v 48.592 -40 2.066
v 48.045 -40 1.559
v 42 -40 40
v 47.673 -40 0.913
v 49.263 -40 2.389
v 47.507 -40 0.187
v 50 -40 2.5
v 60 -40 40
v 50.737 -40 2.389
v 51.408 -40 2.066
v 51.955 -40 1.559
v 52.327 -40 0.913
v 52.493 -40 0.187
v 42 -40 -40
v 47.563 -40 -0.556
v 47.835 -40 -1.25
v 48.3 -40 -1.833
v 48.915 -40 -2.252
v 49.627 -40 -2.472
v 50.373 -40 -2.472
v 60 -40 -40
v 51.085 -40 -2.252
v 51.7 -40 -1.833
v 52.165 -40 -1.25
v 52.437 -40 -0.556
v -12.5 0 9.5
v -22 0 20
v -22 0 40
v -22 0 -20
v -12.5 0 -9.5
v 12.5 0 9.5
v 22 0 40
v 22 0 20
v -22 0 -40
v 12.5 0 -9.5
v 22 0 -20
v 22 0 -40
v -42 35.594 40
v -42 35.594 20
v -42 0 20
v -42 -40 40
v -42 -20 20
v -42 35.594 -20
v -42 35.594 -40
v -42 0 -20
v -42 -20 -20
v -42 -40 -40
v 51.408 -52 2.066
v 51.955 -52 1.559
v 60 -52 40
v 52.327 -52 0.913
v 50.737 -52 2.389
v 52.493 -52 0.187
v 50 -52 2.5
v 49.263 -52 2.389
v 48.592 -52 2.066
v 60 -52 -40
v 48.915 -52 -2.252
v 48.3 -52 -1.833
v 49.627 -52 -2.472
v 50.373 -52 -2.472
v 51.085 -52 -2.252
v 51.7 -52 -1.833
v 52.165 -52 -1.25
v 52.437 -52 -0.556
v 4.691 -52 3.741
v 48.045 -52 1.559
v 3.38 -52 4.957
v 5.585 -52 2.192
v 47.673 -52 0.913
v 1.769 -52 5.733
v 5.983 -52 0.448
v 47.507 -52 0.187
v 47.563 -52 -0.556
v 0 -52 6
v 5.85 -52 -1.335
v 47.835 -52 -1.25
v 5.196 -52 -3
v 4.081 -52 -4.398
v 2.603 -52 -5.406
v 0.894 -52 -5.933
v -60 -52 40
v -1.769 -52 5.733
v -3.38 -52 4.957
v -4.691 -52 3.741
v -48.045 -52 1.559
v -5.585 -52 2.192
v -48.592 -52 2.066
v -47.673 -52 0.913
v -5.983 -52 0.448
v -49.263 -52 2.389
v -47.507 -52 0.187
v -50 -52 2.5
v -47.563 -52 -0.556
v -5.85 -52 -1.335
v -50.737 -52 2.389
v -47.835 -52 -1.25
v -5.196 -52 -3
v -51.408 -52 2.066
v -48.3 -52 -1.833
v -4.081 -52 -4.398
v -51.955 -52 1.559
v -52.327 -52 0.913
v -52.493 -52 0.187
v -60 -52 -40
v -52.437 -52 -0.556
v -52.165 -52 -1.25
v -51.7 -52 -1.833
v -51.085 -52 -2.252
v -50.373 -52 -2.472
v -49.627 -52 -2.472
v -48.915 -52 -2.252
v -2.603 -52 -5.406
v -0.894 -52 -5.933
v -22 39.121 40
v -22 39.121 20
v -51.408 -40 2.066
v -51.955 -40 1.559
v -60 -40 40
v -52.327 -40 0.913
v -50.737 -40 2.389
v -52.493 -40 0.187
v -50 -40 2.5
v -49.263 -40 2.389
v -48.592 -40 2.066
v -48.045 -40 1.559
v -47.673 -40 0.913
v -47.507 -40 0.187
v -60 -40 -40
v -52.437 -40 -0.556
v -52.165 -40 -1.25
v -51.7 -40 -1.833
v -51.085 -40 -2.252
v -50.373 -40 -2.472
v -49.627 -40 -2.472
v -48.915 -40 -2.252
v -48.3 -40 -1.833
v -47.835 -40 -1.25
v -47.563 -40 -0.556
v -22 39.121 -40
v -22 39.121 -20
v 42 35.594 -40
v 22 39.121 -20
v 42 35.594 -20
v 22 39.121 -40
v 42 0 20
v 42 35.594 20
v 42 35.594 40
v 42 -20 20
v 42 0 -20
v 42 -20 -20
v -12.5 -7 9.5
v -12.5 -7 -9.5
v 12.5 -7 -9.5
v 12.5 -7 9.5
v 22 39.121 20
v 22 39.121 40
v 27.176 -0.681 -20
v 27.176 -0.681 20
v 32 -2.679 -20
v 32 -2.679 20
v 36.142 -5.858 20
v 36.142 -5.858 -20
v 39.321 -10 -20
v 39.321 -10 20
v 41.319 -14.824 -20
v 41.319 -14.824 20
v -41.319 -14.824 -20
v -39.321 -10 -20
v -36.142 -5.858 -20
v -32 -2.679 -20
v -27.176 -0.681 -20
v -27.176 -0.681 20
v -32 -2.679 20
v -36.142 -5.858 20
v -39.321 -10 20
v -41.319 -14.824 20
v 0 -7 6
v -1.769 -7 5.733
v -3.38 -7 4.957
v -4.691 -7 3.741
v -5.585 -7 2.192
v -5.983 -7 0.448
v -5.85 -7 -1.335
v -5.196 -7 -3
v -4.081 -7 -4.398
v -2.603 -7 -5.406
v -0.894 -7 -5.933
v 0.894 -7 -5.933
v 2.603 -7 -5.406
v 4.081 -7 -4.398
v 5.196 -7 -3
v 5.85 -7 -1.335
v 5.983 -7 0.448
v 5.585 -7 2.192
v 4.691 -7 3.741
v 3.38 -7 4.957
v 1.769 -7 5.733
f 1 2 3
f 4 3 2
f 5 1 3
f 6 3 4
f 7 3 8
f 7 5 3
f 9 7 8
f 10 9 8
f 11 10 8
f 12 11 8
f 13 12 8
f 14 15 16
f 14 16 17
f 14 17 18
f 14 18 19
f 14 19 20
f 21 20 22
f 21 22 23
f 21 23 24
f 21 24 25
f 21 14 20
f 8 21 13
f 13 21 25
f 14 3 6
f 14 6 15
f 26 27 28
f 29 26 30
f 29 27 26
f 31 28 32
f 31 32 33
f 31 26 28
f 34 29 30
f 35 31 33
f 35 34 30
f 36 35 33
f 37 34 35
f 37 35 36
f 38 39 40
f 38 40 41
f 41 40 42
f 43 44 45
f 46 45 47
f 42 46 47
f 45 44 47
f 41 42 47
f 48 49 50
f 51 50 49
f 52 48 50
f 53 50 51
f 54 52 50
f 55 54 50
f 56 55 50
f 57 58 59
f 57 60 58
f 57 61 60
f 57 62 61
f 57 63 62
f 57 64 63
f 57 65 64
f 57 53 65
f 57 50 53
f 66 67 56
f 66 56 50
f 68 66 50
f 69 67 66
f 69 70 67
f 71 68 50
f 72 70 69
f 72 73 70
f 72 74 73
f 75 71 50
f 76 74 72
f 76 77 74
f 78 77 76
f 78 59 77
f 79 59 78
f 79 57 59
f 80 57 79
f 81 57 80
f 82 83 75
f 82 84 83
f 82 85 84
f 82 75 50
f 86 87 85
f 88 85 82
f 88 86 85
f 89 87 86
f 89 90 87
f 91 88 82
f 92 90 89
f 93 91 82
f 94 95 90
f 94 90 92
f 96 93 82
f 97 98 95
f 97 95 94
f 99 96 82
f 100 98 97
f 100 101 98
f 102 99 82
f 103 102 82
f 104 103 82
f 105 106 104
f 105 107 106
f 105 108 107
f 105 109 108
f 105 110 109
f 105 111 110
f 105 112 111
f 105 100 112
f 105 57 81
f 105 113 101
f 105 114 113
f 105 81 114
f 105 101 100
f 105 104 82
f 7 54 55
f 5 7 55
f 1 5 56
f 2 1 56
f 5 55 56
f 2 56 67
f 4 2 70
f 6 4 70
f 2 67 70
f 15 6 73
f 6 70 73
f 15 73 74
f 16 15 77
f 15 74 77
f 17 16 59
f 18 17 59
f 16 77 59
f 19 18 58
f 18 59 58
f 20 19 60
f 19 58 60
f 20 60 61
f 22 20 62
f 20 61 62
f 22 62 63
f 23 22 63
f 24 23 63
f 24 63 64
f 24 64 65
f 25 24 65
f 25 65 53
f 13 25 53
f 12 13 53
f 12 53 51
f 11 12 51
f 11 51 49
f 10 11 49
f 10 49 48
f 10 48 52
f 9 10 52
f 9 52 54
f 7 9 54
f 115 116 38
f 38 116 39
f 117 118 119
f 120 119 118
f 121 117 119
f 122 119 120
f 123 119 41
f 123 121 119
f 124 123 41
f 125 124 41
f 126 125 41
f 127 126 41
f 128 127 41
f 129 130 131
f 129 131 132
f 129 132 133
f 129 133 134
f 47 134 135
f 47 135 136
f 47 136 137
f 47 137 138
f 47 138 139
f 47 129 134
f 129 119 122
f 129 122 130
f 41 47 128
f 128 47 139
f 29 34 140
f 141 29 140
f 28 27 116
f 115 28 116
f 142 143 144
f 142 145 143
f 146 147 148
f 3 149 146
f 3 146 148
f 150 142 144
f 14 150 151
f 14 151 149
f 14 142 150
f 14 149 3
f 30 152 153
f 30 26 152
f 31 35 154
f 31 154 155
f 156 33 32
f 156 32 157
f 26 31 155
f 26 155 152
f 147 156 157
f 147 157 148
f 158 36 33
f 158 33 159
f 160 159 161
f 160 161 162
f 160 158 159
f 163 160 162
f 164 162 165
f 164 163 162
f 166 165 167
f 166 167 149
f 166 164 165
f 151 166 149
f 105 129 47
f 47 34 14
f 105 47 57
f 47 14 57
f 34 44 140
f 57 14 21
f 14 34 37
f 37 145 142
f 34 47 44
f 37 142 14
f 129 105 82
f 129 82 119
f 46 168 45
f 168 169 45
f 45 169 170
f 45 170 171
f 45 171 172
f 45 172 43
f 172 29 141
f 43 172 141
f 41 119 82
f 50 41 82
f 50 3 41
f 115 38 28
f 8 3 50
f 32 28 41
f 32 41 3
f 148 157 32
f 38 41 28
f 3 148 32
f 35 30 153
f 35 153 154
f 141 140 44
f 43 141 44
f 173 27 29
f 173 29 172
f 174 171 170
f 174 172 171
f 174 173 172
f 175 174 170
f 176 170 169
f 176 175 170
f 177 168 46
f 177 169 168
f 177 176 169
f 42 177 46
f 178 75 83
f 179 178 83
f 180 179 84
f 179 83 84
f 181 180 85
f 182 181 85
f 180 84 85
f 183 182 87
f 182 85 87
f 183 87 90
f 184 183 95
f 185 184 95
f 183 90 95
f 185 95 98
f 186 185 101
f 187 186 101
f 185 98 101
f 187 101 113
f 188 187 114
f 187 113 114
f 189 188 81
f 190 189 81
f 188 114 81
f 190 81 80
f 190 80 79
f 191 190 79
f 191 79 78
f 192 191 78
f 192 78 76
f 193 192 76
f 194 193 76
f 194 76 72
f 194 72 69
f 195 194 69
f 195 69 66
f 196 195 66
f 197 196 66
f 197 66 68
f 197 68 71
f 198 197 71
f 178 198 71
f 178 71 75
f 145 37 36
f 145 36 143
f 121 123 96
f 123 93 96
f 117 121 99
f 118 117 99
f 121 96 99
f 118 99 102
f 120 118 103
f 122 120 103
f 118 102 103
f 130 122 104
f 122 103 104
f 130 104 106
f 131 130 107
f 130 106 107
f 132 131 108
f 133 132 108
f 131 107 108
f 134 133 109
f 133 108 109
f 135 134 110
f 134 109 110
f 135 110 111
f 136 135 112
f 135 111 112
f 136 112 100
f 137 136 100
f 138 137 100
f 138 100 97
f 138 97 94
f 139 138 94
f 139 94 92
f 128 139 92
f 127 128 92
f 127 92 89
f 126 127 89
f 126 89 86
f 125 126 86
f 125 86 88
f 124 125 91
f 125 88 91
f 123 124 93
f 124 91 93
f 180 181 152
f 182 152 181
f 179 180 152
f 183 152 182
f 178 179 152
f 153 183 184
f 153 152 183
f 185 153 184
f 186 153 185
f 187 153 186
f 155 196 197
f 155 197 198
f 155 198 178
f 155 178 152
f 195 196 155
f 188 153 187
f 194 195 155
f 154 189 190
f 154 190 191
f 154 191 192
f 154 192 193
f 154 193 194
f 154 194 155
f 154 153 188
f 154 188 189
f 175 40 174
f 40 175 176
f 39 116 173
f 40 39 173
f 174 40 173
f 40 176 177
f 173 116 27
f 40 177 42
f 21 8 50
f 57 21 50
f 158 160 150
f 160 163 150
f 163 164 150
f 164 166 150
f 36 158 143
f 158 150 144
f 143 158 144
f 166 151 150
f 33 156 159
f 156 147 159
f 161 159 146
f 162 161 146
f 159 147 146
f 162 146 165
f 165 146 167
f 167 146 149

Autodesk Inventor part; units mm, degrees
ref_plane "YZ Plane" through (0, 0, 0) normal (1, 0, 0) x (0, 1, 0)
ref_plane "XZ Plane" through (0, 0, 0) normal (0, 1, 0) x (-1, 0, 0)
ref_plane "XY Plane" through (0, 0, 0) normal (0, 0, 1) x (1, 0, 0)
sketch "Sketch1" plane through (0, 0, 0) normal (0, 0, 1) x (1, 0, 0)
  line L0 (-60, 0) -> (60, 0)
  line L1 (60, 0) -> (60, -52)
  line L2 (60, -52) -> (-60, -52)
  line L3 (-60, -52) -> (-60, 0)
  line L4 (0, -62.4) -> (0, 10.4) projected
  point P0 (0, 0)
  dimension "d0" = 120
  dimension "d1" = 52
extrude "Extrusion1" add sketch "Sketch1" along normal mid plane 80
sketch "Sketch2" plane through (-60, 0, 40) normal (0, 1, 0) x (1, 0, 0)
  line L0 (47.5, 49.5) -> (72.5, 49.5)
  line L1 (72.5, 49.5) -> (72.5, 30.5)
  line L2 (72.5, 30.5) -> (47.5, 30.5)
  line L3 (47.5, 30.5) -> (47.5, 49.5)
  line L4 (-24, 40) -> (144, 40) projected
  line L5 (60, 96) -> (60, -16) projected
  point P0 (60, 40)
  dimension "d4" = 19
  dimension "d5" = 25
extrude "Extrusion2" cut sketch "Sketch2" against normal blind 7
sketch "Sketch3" plane through (-60, 0, 40) normal (0, 1, 0) x (1, 0, 0)
  point P0 (60, 40)
  point P1 (60, 40)
hole "Hole1" at (0, 0, 0) direction (0, -1, 0) diameter 12 end through all
sketch "Sketch4" plane through (-60, 0, 40) normal (0, 1, 0) x (1, 0, 0)
  line L0 (-24, 40) -> (144, 40) projected
  line L1 (60, 96) -> (60, -16) projected
  point P0 (60, 40)
  point P1 (10, 40)
  point P2 (110, 40)
  dimension "d15" = 50
hole "Hole2" at (-50, 0, 0) at (50, 0, 0) direction (0, -1, 0) diameter 5 end through all
sketch "Sketch5" plane through (0, 0, 0) normal (0, 0, 1) x (1, 0, 0)
  circle A0 centre (0, 43) radius 10.1 projected
  line L0 (0, 43) -> (42, 35.5943)
  line L1 (60, 0) -> (-60, 0) projected
  line L2 (42, 35.5943) -> (42, 0)
  line L3 (22, 0) -> (22, 39.1208)
  line L4 (22, 0) -> (42, 0)
  line L5 (0, -10.62) -> (0, 63.72) projected
  line L6 (0, 43) -> (-42, 35.5943)
  line L7 (-60, 0) -> (60, 0)
  line L8 (-42, 35.5943) -> (-42, 0)
  line L9 (-22, 0) -> (-22, 39.1208)
  point P0 (0, 0)
  dimension "d23" = 22
  dimension "d24" = 42
  dimension "d29" = 10
extrude "Extrusion3" add sketch "Sketch5" along normal mid plane 80 contours L0 L2 L1 L3 | L9 L1 L8 L6
sketch "Sketch6" plane through (42, 0, 40) normal (1, 0, 0) x (0, 0, -1)
  line L0 (20, 0) -> (60, 0)
  line L1 (60, 0) -> (60, 44.1208)
  line L2 (60, 44.1208) -> (20, 44.1208)
  line L3 (20, 44.1208) -> (20, 0)
  line L4 (80, 35.5943) -> (80, 0) projected
  line L5 (0, 0) -> (0, 35.5943) projected
  line L6 (80, 39.1208) -> (0, 39.1208) projected
  point P0 (40, 0)
  dimension "d30" = 20
  dimension "d31" = 20
  dimension "d32" = 5
extrude "Extrusion4" cut sketch "Sketch6" against normal through all
sketch "Sketch7" plane through (-60, 0, 40) normal (0, 1, 0) x (1, 0, 0)
  line L0 (0, 0) -> (0, 80) projected
  line L1 (18, 20) -> (18, 0) projected
  line L2 (0, 80) -> (18, 80)
  line L3 (18, 80) -> (18, 0)
  line L4 (18, 0) -> (0, 0)
  line L5 (0, 0) -> (0, 80)
  line L6 (120, 0) -> (102, 0) projected
  line L7 (102, 80) -> (102, 60) projected
  line L8 (120, 0) -> (102, 0)
  line L9 (102, 0) -> (102, 80)
  line L10 (102, 80) -> (120, 80)
  line L11 (120, 80) -> (120, 0)
  point P0 (60, 40)
extrude "Extrusion5" cut sketch "Sketch7" against normal blind 40
fillet "Fillet1" radius 20 2 edges at (-42, 0, 0) (42, 0, 0)
equation "\"d31\" = d30"
properties part number "Foot_Ankl_Connector"
